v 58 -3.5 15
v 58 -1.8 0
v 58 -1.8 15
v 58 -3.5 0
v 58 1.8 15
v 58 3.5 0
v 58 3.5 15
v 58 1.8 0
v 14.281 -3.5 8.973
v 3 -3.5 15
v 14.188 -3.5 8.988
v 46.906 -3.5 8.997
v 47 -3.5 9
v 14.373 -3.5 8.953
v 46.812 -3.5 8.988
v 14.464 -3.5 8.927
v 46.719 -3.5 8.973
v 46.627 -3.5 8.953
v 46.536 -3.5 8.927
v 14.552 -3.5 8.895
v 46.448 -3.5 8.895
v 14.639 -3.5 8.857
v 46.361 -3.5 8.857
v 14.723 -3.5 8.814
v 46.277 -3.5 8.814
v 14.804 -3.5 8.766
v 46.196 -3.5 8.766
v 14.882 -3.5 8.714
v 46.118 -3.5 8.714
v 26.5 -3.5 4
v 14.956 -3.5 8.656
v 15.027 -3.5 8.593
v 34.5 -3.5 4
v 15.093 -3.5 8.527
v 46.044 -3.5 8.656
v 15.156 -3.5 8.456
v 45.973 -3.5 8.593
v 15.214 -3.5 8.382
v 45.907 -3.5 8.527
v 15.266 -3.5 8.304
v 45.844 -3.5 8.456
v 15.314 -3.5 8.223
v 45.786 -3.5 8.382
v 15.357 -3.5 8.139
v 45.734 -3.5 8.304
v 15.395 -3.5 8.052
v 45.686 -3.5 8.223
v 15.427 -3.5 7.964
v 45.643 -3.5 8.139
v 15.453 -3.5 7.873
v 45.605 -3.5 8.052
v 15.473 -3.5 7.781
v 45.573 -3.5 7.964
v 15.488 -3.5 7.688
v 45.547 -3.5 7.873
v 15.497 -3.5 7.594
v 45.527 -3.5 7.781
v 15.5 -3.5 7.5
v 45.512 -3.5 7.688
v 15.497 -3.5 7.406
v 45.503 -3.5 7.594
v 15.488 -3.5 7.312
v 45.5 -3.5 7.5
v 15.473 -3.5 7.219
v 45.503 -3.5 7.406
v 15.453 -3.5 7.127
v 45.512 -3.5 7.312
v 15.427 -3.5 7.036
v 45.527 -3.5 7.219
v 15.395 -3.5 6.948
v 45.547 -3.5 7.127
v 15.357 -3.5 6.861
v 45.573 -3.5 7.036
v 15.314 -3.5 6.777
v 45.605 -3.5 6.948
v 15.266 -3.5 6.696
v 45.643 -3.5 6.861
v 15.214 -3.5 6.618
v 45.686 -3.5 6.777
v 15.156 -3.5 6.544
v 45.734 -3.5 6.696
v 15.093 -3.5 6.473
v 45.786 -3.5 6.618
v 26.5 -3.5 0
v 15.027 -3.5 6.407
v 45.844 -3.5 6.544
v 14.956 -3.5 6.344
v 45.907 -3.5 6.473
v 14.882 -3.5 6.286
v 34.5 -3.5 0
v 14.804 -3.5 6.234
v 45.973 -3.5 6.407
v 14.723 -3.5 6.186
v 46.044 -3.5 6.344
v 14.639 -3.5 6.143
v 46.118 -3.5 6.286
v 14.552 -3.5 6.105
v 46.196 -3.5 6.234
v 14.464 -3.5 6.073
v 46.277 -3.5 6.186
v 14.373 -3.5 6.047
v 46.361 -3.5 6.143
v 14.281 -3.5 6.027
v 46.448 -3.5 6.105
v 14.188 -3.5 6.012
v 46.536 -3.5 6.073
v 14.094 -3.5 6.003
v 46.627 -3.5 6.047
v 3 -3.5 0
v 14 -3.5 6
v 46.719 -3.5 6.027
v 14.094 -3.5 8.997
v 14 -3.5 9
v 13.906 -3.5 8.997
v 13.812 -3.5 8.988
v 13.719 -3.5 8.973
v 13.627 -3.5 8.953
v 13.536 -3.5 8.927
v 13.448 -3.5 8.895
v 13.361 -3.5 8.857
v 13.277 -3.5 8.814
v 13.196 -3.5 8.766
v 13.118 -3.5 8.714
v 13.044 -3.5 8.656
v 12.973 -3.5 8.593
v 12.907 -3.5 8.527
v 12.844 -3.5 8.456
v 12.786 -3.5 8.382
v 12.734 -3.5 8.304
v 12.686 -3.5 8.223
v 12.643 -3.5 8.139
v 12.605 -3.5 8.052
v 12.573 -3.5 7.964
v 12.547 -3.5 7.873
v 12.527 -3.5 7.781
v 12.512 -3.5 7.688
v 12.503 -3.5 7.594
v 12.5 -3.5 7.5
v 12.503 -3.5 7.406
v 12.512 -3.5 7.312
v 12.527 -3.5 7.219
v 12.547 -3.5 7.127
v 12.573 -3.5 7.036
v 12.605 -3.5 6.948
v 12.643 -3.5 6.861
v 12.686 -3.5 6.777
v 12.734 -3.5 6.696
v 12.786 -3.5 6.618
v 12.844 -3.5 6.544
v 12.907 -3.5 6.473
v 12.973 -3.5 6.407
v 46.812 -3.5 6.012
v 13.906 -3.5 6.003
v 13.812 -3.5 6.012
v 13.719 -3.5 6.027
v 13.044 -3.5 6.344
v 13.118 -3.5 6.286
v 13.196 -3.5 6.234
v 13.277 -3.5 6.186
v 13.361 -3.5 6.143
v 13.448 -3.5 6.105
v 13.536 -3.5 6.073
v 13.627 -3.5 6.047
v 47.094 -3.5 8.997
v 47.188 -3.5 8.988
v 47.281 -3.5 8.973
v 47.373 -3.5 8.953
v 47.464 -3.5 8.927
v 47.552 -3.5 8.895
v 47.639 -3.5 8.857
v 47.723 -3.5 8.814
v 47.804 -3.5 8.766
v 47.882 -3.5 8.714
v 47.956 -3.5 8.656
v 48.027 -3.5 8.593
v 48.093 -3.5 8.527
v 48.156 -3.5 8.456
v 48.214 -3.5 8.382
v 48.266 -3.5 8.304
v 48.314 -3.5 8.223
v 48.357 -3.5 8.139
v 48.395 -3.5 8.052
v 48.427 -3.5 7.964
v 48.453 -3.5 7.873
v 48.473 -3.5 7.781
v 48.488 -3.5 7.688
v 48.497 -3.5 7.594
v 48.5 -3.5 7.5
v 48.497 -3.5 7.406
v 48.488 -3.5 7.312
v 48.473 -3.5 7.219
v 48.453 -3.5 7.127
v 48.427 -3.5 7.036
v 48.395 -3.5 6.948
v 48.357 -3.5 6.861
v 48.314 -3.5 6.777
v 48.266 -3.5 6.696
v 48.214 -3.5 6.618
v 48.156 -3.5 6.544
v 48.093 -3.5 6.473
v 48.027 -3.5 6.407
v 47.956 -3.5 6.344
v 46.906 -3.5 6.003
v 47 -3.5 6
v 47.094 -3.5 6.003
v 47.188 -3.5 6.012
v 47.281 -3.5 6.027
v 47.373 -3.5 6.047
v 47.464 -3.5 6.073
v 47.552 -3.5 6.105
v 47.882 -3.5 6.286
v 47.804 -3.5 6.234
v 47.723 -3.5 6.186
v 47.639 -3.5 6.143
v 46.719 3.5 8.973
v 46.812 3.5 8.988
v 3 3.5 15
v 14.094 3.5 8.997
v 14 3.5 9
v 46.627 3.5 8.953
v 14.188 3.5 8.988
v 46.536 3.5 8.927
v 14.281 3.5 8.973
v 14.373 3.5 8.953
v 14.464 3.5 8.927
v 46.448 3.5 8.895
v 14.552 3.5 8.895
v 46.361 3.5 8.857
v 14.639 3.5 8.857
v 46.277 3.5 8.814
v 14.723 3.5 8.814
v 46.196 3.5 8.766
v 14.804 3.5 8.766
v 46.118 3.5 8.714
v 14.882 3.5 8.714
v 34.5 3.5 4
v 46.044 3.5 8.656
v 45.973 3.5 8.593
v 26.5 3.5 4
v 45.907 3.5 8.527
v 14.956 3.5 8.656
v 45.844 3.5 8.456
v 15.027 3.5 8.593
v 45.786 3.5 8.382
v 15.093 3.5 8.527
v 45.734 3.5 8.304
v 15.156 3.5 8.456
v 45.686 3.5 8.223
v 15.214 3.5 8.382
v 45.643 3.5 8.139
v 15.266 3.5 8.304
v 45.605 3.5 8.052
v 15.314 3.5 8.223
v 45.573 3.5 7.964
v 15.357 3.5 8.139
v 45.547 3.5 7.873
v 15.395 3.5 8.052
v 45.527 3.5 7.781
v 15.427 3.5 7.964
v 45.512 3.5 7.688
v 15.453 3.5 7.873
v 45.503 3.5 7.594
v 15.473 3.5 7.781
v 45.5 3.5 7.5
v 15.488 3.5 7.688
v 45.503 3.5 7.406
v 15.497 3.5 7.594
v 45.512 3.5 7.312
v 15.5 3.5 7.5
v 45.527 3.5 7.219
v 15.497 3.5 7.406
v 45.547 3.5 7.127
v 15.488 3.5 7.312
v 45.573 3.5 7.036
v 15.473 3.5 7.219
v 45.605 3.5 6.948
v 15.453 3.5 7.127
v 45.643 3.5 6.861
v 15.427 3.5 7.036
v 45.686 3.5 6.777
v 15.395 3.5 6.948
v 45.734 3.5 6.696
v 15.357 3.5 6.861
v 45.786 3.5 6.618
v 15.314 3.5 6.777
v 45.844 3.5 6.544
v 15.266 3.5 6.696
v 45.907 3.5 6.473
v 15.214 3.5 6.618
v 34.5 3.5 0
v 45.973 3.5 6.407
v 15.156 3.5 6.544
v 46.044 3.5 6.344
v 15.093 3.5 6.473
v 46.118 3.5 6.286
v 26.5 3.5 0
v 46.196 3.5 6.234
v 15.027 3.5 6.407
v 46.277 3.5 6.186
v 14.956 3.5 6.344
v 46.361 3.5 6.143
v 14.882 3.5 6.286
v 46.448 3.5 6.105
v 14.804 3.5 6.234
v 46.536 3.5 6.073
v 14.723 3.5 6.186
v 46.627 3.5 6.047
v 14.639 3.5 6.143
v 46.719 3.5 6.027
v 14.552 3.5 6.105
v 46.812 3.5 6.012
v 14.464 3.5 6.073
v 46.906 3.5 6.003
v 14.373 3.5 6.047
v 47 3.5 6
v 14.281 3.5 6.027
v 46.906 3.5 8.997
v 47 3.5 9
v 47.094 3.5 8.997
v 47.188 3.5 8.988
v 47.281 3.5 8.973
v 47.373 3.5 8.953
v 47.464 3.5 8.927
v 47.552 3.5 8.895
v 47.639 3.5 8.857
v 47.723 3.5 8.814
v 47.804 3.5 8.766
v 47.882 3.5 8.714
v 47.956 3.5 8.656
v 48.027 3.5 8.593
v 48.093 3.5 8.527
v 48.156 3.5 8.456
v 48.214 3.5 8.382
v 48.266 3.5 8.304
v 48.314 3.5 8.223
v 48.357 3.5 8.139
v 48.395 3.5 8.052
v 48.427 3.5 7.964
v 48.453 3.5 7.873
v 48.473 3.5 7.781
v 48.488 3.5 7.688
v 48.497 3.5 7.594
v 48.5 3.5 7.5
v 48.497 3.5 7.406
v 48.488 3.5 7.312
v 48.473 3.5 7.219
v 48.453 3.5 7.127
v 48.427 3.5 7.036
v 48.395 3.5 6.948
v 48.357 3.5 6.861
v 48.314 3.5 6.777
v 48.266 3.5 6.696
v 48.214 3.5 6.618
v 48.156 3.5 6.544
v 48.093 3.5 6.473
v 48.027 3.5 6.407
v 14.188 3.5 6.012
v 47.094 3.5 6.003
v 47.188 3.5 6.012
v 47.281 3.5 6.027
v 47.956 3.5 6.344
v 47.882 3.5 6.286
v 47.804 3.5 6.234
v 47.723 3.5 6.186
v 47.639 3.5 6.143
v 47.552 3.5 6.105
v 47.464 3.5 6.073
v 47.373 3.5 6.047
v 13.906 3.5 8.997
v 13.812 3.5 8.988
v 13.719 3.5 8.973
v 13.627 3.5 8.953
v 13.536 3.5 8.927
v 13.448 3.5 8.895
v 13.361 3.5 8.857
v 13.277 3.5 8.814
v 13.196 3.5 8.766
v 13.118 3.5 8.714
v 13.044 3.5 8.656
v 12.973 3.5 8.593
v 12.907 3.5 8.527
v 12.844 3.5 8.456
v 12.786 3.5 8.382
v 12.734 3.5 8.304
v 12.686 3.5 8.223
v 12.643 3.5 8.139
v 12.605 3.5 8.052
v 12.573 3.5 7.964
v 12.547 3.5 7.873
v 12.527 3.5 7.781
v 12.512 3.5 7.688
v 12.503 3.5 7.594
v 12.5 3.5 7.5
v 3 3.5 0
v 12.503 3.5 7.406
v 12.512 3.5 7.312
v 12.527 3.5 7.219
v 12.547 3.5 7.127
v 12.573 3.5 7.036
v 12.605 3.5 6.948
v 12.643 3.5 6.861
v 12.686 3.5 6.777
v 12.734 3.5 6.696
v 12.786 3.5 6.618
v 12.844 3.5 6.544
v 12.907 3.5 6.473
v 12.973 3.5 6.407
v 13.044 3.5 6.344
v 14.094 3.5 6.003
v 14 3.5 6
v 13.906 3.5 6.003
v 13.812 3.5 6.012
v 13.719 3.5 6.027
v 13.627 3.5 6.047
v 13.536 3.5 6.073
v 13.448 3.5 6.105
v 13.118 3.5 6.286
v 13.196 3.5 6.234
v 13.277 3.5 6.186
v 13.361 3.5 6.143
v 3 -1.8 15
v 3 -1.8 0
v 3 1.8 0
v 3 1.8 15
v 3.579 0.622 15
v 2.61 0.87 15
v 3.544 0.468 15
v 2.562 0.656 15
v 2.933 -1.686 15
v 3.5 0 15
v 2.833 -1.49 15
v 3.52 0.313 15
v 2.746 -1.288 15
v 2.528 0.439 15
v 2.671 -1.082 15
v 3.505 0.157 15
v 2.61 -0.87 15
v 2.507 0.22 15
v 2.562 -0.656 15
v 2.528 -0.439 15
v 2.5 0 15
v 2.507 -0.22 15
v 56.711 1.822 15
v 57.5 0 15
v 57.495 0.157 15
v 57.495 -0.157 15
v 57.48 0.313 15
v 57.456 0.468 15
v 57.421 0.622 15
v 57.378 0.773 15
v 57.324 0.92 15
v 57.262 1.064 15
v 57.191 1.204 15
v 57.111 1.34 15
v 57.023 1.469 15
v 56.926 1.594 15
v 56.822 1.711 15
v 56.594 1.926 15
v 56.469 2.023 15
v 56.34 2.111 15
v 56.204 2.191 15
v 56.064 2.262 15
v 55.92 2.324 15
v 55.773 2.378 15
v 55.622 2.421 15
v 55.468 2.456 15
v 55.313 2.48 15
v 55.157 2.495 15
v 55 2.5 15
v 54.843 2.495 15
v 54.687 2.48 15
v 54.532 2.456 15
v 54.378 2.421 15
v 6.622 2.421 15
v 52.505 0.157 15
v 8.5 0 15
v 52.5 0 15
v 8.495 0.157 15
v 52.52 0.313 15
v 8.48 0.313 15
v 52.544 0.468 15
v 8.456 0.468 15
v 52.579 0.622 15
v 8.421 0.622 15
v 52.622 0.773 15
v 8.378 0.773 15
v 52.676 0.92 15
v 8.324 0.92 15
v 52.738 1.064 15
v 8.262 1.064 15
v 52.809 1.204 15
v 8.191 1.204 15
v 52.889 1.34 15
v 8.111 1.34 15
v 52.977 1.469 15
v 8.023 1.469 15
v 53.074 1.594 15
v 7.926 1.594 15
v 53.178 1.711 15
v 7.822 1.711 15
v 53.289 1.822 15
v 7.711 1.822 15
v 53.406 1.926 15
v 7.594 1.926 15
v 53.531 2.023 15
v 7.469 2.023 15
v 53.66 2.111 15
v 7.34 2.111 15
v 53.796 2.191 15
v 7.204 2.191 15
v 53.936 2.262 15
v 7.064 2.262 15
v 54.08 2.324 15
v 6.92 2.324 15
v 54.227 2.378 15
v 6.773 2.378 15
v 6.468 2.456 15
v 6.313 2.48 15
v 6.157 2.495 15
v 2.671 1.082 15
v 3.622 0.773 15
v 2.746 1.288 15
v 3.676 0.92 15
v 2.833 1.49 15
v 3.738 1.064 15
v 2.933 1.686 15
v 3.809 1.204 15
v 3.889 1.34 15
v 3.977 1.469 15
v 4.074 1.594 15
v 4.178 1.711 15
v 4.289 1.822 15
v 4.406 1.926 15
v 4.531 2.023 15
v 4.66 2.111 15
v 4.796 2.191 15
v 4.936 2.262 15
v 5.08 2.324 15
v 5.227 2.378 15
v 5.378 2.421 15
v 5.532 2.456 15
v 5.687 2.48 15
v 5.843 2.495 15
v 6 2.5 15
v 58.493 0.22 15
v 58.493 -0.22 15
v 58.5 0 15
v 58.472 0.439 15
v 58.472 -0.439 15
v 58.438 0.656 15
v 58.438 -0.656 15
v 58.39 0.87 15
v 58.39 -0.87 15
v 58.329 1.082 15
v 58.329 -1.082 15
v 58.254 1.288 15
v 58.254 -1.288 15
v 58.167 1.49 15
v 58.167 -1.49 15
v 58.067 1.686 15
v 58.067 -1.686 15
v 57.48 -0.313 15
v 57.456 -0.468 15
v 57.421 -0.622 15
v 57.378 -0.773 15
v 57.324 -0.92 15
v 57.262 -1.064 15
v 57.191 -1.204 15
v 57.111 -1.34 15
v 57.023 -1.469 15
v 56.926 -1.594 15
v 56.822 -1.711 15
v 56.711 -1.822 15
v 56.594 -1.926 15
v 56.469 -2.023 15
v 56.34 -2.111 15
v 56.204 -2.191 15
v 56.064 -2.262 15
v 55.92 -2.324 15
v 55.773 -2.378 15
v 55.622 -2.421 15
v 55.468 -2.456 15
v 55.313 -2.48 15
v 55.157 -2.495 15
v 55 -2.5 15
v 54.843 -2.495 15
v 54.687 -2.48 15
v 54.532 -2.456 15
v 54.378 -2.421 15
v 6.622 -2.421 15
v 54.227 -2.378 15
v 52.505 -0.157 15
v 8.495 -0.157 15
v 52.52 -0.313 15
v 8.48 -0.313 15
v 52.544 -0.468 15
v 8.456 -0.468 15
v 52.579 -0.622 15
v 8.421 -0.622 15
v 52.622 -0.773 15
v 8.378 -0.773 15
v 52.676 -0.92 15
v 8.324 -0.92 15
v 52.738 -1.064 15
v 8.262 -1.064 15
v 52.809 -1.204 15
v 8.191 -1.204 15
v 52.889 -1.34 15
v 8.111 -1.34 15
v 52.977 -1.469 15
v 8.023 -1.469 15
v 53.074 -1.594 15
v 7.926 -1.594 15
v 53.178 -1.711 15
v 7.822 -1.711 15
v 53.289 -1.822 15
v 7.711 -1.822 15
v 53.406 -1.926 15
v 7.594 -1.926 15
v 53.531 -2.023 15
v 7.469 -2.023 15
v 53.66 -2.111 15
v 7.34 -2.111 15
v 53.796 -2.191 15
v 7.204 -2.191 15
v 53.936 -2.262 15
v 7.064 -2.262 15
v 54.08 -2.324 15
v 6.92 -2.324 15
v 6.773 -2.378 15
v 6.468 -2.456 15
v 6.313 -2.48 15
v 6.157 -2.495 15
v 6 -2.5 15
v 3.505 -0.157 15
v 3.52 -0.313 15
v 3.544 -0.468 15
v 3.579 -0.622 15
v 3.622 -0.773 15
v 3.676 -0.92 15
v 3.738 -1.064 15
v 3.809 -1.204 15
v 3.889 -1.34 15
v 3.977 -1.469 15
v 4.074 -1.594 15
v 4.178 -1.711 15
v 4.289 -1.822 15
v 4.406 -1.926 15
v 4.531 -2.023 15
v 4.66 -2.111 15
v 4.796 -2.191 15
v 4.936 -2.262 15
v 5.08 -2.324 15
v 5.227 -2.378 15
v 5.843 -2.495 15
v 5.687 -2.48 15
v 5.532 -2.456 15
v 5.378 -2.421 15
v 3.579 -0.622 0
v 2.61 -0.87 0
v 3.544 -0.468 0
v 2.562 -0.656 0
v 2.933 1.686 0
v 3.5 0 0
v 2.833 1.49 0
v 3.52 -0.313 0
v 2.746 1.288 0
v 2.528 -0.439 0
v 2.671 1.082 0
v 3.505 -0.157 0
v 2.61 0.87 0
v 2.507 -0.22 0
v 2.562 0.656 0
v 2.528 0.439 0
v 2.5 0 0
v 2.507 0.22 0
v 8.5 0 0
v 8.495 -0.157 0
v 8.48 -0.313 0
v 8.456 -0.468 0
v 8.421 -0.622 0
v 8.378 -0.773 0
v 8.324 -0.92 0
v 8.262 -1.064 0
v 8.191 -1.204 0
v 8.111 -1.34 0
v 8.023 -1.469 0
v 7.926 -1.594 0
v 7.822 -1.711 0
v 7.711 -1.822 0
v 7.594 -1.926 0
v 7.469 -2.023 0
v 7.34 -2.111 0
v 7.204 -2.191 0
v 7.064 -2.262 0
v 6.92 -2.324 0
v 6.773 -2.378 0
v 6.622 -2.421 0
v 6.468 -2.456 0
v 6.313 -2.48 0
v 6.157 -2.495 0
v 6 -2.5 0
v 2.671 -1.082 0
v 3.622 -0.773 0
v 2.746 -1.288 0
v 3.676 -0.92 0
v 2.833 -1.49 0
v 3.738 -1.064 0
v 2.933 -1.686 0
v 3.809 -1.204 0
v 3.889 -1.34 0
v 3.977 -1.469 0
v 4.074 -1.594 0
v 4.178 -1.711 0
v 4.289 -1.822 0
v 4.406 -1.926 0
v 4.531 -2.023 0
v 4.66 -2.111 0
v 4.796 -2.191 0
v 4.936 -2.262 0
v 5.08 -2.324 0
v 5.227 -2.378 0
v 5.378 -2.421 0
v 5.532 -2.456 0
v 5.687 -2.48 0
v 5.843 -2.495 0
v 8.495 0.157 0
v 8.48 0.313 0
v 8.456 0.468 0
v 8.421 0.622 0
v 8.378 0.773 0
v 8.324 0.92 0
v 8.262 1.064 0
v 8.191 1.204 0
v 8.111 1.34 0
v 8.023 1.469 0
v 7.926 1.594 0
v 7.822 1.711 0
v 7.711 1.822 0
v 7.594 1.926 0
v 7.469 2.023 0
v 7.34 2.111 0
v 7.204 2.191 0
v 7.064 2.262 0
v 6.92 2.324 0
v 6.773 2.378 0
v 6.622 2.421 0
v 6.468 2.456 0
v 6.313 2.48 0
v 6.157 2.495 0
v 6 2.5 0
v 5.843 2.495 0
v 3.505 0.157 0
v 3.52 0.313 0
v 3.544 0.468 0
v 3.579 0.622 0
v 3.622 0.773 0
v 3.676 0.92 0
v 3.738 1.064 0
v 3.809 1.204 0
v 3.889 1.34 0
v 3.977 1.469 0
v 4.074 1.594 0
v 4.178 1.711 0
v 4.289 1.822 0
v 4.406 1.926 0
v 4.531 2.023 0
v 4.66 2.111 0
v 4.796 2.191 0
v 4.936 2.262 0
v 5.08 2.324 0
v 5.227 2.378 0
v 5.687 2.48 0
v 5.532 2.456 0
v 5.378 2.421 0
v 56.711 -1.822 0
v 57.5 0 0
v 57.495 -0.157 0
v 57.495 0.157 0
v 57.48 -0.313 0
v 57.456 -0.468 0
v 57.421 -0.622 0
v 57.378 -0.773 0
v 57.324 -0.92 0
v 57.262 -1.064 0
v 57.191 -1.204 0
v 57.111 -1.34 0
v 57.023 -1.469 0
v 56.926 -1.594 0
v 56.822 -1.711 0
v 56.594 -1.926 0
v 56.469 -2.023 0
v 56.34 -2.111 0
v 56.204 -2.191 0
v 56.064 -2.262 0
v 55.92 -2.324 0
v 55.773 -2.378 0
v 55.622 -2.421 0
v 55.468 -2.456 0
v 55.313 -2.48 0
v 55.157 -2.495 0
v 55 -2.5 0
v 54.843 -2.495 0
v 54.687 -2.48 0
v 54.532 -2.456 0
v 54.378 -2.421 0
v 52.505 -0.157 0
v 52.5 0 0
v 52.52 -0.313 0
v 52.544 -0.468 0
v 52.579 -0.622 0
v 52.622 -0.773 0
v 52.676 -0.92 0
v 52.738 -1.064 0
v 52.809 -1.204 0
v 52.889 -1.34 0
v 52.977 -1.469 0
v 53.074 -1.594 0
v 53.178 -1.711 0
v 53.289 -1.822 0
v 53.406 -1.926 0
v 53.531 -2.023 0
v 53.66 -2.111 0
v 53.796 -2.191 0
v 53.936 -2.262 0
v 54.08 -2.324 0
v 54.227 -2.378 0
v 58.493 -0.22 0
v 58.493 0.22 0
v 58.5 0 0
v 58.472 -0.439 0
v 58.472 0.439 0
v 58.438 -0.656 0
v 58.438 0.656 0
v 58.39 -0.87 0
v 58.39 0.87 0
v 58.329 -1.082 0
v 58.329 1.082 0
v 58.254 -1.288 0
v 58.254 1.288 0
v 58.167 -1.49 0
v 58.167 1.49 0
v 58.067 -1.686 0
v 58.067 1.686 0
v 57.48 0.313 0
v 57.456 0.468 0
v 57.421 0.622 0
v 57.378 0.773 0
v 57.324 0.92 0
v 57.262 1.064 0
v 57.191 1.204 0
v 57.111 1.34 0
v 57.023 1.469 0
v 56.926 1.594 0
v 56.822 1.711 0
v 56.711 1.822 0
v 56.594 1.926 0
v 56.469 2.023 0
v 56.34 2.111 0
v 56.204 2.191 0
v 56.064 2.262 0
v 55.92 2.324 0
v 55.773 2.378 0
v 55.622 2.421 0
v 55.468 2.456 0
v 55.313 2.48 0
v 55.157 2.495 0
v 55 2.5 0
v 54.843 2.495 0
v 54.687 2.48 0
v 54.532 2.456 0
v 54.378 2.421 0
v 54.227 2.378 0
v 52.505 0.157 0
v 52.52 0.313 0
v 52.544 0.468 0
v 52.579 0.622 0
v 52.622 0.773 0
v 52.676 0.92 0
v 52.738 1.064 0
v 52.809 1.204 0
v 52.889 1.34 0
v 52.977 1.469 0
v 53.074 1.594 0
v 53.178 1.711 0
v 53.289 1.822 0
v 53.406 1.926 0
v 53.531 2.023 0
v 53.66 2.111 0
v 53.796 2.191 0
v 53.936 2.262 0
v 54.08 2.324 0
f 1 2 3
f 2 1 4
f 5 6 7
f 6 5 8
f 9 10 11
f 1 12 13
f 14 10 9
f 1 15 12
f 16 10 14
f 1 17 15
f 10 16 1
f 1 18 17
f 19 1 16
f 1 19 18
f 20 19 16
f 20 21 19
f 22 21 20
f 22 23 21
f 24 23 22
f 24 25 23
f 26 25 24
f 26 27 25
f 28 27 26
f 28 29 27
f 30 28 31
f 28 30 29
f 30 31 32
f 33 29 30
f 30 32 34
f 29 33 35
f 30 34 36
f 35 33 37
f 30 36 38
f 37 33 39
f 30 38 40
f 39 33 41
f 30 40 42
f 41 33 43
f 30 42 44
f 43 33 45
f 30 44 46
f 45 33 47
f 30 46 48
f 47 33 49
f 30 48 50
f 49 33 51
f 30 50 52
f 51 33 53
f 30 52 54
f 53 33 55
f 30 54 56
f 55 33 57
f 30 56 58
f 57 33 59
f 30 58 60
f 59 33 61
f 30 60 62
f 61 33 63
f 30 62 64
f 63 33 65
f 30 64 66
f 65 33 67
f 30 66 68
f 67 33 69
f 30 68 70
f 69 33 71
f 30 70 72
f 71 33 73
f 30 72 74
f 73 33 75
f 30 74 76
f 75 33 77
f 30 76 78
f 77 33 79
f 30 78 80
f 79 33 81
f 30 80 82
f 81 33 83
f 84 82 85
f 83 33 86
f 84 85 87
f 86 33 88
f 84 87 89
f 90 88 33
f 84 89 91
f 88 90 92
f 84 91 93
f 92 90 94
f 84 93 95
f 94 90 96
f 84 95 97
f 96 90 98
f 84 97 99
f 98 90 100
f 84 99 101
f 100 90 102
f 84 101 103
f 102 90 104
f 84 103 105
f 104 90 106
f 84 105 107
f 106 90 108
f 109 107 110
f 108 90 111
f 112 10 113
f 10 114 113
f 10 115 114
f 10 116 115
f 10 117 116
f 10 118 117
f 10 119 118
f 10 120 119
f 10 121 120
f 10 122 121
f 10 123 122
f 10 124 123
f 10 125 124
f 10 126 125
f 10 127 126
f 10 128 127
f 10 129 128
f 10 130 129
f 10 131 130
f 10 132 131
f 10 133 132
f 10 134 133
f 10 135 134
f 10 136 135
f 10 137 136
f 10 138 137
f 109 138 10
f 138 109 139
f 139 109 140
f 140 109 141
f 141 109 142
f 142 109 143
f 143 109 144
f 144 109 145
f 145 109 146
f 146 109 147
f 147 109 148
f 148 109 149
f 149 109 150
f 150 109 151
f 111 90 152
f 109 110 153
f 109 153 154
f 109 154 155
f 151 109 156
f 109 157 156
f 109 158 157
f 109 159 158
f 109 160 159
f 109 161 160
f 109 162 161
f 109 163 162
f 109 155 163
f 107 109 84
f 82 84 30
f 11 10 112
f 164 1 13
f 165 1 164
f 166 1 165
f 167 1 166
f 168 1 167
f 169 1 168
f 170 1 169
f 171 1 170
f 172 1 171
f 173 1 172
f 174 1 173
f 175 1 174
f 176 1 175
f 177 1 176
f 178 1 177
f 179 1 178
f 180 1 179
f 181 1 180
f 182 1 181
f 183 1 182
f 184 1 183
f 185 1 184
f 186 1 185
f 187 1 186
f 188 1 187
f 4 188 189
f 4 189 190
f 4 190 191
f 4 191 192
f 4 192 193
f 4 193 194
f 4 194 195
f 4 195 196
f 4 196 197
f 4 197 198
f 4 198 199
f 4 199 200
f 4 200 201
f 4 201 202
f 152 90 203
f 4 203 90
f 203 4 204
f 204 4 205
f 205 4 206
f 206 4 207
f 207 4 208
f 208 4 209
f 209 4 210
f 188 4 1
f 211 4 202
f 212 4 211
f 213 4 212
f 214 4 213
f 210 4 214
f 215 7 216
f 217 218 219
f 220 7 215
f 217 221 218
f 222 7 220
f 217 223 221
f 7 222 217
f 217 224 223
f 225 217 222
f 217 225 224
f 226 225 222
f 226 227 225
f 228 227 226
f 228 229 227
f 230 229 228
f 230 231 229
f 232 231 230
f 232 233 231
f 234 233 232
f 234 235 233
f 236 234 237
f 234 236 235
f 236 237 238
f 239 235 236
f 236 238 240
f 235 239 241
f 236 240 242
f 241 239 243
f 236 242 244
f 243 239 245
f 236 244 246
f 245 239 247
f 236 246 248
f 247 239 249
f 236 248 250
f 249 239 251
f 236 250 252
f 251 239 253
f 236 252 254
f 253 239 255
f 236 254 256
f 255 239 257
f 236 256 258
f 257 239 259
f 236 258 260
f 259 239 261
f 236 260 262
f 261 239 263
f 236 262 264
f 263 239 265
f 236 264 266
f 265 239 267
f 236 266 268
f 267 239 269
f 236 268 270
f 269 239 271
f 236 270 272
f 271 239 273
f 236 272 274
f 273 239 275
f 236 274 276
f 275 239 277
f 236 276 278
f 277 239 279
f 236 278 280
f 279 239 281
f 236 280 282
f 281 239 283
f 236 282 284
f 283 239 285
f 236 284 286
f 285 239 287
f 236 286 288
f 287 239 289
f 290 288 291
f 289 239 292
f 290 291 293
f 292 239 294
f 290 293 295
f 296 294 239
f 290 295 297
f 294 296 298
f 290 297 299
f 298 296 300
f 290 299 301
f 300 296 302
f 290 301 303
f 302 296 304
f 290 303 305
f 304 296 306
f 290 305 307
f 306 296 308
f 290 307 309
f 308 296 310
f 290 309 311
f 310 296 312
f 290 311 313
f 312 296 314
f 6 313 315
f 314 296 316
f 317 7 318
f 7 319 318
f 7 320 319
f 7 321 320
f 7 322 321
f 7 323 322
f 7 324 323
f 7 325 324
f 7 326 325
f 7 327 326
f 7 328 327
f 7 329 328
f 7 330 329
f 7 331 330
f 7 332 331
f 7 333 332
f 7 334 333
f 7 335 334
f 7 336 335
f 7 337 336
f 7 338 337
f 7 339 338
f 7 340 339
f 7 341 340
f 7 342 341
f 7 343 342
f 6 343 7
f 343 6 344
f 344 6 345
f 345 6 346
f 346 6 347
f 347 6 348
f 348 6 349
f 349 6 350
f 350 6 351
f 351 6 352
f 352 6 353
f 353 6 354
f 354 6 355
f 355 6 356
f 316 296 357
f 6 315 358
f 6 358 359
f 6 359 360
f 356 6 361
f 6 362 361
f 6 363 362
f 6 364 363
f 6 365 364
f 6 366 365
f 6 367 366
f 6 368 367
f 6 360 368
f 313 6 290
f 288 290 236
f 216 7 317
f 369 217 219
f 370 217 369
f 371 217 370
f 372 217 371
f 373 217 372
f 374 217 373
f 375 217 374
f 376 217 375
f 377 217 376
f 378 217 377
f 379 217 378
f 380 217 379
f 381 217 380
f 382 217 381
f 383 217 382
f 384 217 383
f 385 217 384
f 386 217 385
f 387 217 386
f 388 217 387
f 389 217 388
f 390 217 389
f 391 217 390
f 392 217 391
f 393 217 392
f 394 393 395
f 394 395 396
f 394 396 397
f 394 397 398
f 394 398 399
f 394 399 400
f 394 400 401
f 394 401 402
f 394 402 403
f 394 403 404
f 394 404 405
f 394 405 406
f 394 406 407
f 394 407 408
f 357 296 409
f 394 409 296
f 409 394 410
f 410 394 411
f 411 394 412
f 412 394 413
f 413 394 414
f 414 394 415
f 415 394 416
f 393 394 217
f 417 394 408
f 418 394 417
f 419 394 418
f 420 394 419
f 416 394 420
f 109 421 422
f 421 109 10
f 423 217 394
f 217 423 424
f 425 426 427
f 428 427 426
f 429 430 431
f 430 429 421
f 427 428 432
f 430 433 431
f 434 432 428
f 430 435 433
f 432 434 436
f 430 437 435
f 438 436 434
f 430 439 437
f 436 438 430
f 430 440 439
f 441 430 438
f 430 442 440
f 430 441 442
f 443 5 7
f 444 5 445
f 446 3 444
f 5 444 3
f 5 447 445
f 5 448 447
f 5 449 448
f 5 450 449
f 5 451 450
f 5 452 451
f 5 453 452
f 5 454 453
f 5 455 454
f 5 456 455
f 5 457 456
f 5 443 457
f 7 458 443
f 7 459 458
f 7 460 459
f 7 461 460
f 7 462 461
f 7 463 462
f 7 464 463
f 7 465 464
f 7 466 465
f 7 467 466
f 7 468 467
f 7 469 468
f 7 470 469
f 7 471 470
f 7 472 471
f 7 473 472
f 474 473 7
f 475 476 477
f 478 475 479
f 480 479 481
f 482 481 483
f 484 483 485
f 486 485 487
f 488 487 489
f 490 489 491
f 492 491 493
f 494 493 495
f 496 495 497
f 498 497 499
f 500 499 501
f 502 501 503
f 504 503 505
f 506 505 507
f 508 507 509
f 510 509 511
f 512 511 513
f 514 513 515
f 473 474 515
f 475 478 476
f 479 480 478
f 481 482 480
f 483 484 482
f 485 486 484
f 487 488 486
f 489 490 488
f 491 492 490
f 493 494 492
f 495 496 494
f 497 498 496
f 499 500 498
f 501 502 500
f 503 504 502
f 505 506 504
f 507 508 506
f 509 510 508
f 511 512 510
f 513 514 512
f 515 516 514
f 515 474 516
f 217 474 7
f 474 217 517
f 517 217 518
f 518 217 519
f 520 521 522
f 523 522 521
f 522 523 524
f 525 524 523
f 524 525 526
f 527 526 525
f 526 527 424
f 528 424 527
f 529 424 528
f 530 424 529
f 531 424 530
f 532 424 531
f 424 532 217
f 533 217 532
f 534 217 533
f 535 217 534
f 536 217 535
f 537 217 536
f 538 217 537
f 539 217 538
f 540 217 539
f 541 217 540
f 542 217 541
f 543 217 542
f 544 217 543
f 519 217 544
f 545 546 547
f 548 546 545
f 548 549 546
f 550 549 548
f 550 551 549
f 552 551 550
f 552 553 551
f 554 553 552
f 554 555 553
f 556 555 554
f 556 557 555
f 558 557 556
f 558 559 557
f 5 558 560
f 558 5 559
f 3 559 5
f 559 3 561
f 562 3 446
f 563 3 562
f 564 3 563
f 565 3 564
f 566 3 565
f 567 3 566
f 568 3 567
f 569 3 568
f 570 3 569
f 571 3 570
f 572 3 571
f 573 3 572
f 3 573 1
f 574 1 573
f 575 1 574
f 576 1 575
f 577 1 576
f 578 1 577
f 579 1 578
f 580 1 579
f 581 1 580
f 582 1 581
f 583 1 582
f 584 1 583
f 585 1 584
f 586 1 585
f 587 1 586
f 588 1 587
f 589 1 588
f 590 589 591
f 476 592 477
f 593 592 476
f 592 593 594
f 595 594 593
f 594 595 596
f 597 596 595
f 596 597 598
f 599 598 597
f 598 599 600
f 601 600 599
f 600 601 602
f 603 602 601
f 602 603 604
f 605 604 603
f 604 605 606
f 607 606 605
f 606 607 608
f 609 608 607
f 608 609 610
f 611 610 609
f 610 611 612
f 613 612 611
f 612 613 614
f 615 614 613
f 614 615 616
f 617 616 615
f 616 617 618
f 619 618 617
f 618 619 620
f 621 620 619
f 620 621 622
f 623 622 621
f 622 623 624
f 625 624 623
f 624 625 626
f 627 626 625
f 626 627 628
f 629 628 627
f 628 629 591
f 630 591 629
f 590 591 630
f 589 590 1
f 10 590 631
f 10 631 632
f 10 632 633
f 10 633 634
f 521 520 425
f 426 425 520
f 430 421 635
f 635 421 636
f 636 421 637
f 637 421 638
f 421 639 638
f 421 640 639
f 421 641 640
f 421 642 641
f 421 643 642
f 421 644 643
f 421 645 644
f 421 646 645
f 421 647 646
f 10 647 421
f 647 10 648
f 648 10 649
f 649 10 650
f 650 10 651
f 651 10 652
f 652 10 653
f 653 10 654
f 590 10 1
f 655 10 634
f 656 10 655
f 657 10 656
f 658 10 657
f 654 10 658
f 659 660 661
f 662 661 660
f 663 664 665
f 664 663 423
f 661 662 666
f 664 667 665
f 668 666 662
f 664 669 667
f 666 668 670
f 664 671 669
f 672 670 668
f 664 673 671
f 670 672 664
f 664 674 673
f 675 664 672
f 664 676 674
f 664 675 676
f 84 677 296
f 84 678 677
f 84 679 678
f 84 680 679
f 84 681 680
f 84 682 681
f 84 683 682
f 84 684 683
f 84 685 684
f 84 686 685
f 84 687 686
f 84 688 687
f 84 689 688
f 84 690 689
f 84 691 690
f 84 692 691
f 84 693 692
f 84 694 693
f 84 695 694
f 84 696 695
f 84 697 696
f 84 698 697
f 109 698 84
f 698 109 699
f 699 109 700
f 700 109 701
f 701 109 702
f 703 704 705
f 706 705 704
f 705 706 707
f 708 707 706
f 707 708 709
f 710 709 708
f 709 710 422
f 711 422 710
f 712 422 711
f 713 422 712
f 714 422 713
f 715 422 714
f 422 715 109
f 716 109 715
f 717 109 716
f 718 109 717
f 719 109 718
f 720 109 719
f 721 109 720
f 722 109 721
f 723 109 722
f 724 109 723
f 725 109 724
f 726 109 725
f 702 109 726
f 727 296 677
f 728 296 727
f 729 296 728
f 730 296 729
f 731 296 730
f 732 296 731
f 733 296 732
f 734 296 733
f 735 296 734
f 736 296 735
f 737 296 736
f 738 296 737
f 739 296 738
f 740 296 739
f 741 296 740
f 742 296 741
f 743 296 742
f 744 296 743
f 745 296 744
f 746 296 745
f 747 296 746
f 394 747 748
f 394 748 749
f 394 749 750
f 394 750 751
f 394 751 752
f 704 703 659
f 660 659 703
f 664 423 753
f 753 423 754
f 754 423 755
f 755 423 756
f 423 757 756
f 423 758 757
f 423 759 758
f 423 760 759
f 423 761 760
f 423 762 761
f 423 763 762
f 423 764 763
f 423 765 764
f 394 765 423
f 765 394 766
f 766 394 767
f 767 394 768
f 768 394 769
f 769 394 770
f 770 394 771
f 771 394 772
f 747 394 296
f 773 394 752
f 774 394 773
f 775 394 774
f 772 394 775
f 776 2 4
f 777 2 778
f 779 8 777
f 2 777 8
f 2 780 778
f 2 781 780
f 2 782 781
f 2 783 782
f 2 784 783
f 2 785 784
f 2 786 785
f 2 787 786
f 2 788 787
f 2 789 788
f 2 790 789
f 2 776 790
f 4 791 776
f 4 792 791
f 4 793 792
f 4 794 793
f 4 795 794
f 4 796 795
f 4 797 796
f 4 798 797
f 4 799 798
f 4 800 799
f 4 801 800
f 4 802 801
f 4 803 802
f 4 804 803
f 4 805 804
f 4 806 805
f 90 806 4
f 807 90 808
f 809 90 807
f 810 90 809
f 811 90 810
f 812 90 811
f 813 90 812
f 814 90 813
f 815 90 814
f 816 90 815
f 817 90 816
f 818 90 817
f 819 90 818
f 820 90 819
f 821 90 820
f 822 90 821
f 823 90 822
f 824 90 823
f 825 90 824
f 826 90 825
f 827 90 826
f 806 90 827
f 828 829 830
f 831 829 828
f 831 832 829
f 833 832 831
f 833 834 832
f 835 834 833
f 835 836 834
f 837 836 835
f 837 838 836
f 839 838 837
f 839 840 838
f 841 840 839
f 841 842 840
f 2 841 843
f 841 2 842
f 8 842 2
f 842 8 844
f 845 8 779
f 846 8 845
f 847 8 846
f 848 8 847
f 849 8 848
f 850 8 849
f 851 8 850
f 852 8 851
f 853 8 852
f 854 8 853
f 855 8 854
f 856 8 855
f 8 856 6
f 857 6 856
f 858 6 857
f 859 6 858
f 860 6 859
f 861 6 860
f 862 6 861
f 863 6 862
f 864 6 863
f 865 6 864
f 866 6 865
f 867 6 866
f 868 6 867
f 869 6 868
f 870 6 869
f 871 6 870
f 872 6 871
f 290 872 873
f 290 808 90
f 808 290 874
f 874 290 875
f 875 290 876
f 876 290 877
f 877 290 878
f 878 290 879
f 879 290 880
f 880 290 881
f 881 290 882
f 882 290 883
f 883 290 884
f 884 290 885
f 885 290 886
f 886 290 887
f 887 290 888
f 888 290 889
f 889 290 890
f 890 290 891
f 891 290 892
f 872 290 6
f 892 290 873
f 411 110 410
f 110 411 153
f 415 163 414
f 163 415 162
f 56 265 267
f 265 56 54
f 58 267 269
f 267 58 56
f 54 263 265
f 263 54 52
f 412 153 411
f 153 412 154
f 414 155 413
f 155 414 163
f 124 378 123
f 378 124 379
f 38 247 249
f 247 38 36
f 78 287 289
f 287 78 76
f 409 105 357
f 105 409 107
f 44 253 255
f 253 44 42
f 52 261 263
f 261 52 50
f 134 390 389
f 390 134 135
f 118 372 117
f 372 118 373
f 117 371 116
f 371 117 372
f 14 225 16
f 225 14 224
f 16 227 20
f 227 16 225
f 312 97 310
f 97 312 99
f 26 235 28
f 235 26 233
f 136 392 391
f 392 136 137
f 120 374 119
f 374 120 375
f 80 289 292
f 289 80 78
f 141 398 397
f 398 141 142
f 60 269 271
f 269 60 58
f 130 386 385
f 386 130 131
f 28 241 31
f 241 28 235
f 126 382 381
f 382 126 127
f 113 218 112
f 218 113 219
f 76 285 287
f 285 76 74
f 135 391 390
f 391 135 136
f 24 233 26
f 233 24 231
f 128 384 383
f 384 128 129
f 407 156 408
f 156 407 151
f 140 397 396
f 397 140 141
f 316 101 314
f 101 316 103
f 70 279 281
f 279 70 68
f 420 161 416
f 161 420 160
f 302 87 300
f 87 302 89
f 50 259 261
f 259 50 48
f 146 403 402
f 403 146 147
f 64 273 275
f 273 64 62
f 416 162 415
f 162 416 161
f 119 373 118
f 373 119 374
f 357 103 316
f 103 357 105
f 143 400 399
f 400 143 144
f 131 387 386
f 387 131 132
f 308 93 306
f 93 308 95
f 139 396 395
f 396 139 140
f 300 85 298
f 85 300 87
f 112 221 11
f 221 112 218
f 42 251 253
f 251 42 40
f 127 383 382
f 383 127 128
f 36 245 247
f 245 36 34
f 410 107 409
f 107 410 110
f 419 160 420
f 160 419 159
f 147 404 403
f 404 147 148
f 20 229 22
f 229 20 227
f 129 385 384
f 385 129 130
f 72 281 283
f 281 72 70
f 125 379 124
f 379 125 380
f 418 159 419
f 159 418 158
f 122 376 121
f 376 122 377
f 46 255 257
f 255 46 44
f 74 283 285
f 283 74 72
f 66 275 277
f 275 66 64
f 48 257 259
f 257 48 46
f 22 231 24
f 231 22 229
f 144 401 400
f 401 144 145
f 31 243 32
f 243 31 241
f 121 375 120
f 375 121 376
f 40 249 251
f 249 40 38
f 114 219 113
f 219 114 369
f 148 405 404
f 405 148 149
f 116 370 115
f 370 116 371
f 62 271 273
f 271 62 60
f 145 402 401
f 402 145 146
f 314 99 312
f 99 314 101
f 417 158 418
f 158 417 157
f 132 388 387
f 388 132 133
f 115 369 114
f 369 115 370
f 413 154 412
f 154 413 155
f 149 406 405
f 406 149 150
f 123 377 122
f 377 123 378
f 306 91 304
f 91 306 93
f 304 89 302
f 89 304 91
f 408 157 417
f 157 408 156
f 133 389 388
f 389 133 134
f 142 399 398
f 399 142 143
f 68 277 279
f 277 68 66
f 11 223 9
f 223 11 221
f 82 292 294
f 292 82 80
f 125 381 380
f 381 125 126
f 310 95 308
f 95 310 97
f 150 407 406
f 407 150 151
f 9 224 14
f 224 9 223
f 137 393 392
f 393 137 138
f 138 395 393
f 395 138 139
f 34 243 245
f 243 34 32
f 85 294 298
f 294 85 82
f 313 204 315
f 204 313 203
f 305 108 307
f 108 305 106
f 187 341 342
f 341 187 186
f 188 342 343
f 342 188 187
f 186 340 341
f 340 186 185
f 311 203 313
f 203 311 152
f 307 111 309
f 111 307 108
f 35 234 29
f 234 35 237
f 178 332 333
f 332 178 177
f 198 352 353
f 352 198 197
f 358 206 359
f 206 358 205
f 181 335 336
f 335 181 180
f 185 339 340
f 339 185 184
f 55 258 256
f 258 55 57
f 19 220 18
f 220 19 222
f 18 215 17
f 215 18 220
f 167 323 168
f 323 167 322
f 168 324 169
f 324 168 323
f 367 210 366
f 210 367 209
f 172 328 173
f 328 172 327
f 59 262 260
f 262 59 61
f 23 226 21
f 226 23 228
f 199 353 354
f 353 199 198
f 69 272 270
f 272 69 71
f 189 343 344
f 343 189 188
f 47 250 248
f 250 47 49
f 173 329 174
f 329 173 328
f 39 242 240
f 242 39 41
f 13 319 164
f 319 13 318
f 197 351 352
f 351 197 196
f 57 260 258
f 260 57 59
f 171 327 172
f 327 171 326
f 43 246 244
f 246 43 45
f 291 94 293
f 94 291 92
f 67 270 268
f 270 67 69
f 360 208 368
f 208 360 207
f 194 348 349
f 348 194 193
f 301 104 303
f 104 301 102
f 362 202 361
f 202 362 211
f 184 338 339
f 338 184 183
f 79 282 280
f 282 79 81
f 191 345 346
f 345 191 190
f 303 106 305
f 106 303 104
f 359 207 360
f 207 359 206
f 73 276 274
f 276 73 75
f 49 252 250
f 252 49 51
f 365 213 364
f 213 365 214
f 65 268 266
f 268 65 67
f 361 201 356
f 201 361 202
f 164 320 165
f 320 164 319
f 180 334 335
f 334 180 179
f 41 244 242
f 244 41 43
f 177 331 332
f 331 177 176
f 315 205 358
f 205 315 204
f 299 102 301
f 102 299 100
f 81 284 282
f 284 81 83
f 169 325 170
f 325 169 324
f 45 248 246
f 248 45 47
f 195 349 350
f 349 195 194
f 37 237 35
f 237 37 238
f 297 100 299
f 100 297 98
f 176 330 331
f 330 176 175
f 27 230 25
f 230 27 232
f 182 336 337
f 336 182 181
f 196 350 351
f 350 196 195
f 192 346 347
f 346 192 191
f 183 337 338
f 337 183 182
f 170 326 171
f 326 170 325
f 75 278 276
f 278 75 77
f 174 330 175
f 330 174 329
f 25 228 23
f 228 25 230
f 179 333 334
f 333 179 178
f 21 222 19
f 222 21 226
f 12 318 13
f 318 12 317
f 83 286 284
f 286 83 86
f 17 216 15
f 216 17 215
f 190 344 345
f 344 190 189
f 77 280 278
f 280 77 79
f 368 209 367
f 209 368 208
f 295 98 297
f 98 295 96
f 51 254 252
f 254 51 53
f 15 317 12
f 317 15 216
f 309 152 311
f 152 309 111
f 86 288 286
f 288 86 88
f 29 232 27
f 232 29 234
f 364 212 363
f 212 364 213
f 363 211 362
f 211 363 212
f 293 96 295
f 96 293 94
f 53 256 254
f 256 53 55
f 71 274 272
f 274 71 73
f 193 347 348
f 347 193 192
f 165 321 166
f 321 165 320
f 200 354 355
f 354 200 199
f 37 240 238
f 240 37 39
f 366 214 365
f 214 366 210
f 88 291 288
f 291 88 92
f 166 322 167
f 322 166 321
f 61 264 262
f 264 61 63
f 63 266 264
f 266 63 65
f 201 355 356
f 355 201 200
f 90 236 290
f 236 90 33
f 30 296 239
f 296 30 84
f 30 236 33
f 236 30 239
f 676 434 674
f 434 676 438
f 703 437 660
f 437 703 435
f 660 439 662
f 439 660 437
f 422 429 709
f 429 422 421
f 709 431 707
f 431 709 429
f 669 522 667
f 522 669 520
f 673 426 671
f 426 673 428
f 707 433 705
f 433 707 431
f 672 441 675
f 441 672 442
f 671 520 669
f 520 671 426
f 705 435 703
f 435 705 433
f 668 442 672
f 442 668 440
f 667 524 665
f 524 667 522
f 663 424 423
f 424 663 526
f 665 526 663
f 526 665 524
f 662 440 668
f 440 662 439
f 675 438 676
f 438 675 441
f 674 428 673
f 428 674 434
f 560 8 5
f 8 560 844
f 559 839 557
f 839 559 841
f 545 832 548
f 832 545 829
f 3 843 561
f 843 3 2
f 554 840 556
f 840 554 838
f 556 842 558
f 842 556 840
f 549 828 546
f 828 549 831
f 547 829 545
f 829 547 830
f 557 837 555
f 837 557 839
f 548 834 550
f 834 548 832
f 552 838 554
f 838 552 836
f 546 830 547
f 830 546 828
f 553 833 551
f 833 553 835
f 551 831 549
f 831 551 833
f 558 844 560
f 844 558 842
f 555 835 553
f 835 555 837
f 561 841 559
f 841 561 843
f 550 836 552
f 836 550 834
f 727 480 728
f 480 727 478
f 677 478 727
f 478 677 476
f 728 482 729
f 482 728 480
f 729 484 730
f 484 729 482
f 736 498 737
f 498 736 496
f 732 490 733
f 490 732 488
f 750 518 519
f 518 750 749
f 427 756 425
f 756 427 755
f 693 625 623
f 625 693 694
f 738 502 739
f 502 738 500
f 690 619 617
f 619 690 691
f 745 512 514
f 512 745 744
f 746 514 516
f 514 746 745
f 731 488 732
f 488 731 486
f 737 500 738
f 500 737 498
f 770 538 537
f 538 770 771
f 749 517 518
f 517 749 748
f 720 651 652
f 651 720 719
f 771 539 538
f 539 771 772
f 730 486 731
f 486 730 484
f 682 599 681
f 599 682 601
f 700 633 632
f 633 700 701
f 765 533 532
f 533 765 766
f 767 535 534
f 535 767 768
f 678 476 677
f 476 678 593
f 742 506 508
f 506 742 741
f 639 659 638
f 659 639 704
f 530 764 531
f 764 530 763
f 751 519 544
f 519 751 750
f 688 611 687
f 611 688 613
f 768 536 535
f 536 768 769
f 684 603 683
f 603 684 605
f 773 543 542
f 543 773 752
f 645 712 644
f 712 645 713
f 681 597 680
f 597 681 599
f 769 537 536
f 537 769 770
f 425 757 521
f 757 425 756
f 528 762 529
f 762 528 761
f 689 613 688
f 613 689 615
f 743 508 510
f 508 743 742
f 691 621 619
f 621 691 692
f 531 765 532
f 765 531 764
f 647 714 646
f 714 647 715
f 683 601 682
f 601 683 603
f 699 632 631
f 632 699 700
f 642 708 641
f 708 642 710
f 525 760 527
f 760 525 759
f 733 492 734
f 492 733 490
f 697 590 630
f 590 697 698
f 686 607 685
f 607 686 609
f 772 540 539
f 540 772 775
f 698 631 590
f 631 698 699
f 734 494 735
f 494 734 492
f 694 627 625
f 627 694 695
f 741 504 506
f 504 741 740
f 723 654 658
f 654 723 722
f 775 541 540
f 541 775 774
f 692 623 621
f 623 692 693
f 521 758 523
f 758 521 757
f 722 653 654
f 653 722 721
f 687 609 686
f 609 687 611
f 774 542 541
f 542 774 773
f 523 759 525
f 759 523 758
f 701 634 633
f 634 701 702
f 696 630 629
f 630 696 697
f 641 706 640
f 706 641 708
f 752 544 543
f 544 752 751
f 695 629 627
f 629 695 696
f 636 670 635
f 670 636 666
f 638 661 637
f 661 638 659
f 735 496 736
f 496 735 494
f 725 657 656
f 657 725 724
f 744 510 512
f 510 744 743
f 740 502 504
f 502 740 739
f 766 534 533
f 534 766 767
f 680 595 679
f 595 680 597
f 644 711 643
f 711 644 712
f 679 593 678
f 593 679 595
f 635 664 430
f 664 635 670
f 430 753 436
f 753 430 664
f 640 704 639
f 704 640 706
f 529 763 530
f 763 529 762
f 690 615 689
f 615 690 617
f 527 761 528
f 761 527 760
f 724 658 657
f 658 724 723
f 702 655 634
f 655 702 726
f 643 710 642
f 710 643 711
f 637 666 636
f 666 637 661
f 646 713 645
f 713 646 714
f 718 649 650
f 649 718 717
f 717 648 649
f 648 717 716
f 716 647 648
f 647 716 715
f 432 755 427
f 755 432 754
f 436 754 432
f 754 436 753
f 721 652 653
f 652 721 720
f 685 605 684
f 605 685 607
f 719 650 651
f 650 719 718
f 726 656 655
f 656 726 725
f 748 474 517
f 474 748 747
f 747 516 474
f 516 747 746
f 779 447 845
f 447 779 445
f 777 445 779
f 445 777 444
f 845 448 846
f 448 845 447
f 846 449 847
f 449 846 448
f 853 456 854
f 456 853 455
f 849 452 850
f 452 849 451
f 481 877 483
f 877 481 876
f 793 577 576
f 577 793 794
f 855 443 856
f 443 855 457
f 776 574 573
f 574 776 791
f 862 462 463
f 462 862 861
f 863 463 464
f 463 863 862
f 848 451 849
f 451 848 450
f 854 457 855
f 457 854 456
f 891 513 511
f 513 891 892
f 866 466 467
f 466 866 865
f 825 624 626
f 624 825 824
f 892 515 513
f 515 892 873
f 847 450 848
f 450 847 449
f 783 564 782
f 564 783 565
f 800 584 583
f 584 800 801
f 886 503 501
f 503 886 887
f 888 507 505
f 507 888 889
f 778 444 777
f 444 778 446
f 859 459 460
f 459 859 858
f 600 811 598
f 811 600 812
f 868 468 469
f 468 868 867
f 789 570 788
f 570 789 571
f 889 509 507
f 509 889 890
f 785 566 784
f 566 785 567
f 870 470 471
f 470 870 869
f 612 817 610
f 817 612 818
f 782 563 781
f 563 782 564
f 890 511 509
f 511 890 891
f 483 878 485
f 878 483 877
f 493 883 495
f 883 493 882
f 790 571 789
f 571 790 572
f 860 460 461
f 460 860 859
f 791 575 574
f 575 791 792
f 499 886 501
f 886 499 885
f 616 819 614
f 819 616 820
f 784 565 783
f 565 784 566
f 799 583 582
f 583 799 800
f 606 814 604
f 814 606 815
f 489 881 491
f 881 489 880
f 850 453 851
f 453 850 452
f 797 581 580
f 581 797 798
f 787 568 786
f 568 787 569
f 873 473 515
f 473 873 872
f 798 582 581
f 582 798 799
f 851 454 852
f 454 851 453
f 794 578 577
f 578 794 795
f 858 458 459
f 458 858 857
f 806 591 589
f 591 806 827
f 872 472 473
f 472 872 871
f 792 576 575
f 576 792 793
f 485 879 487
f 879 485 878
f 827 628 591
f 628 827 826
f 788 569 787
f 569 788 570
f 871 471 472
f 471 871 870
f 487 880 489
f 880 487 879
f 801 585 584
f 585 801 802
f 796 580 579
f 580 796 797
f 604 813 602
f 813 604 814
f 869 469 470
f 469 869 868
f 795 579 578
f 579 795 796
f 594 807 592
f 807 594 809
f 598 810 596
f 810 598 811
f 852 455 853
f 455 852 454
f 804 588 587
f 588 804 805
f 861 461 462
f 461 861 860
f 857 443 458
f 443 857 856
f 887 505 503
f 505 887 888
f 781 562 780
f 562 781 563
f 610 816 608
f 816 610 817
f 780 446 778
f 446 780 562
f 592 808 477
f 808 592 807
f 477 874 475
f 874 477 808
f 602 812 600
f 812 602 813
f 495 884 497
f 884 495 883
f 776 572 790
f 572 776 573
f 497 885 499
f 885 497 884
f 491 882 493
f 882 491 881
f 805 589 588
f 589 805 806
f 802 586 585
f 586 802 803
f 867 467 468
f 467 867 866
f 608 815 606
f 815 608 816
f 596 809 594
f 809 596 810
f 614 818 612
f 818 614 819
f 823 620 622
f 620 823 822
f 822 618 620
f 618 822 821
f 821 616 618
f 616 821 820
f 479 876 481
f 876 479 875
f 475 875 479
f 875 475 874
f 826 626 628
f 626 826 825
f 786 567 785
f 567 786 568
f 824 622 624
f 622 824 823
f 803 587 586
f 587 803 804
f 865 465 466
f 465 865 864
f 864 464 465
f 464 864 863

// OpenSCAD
/****************************************************************
* title: rocket payload spacer
* author: Boris du Reau
* version: 1.0
* date: 07/02/2018
* 
* Description: print a payload spacer
* Howto use it:
* Modify the variables values so that it fits to your rocket tube 
* then just click on "compile and render" 
* Note that all units ar metrics
*****************************************************************/

/* adjust variables here */ 
/* It is recommended to print a sample to make sure that the diameter is correct */

spacerHeight = 7 ;
spacerWidth = 15 ;
spacerLenght = 55 ;
spacerHoleDiam = 5;
spacerHoleDist = 50;
spacerPlateHoleDiam = 3;
resolution = 100;

$fn=resolution; 

module berceau()
{
difference () {
cube([spacerLenght, spacerWidth, spacerHeight]);
translate ([spacerHoleDiam*2+1,spacerWidth/2,0])cylinder(h=spacerWidth, r=spacerPlateHoleDiam/2);
translate ([spacerLenght-(spacerHoleDiam*2+1),spacerWidth/2,0])cylinder(h=spacerWidth, r=spacerPlateHoleDiam/2);
translate ([(spacerLenght/2)-4,0,0])cube([8, 4, spacerHeight]);
}

}

module mybec () {
translate ([6,0,0])cylinder (h=spacerWidth, r=3.5);
rotate ([90,0,0])translate ([3,0,-3.5])berceau();
translate ([spacerLenght,0,0]) cylinder (h=spacerWidth, r=3.5);
}

//mybec ();
difference () {mybec ();
translate ([6,0,-1]) cylinder (h=spacerWidth+2, r=spacerHoleDiam/2);
translate ([spacerLenght,0,-1]) cylinder (h=spacerWidth+2, r=spacerHoleDiam/2);
}
